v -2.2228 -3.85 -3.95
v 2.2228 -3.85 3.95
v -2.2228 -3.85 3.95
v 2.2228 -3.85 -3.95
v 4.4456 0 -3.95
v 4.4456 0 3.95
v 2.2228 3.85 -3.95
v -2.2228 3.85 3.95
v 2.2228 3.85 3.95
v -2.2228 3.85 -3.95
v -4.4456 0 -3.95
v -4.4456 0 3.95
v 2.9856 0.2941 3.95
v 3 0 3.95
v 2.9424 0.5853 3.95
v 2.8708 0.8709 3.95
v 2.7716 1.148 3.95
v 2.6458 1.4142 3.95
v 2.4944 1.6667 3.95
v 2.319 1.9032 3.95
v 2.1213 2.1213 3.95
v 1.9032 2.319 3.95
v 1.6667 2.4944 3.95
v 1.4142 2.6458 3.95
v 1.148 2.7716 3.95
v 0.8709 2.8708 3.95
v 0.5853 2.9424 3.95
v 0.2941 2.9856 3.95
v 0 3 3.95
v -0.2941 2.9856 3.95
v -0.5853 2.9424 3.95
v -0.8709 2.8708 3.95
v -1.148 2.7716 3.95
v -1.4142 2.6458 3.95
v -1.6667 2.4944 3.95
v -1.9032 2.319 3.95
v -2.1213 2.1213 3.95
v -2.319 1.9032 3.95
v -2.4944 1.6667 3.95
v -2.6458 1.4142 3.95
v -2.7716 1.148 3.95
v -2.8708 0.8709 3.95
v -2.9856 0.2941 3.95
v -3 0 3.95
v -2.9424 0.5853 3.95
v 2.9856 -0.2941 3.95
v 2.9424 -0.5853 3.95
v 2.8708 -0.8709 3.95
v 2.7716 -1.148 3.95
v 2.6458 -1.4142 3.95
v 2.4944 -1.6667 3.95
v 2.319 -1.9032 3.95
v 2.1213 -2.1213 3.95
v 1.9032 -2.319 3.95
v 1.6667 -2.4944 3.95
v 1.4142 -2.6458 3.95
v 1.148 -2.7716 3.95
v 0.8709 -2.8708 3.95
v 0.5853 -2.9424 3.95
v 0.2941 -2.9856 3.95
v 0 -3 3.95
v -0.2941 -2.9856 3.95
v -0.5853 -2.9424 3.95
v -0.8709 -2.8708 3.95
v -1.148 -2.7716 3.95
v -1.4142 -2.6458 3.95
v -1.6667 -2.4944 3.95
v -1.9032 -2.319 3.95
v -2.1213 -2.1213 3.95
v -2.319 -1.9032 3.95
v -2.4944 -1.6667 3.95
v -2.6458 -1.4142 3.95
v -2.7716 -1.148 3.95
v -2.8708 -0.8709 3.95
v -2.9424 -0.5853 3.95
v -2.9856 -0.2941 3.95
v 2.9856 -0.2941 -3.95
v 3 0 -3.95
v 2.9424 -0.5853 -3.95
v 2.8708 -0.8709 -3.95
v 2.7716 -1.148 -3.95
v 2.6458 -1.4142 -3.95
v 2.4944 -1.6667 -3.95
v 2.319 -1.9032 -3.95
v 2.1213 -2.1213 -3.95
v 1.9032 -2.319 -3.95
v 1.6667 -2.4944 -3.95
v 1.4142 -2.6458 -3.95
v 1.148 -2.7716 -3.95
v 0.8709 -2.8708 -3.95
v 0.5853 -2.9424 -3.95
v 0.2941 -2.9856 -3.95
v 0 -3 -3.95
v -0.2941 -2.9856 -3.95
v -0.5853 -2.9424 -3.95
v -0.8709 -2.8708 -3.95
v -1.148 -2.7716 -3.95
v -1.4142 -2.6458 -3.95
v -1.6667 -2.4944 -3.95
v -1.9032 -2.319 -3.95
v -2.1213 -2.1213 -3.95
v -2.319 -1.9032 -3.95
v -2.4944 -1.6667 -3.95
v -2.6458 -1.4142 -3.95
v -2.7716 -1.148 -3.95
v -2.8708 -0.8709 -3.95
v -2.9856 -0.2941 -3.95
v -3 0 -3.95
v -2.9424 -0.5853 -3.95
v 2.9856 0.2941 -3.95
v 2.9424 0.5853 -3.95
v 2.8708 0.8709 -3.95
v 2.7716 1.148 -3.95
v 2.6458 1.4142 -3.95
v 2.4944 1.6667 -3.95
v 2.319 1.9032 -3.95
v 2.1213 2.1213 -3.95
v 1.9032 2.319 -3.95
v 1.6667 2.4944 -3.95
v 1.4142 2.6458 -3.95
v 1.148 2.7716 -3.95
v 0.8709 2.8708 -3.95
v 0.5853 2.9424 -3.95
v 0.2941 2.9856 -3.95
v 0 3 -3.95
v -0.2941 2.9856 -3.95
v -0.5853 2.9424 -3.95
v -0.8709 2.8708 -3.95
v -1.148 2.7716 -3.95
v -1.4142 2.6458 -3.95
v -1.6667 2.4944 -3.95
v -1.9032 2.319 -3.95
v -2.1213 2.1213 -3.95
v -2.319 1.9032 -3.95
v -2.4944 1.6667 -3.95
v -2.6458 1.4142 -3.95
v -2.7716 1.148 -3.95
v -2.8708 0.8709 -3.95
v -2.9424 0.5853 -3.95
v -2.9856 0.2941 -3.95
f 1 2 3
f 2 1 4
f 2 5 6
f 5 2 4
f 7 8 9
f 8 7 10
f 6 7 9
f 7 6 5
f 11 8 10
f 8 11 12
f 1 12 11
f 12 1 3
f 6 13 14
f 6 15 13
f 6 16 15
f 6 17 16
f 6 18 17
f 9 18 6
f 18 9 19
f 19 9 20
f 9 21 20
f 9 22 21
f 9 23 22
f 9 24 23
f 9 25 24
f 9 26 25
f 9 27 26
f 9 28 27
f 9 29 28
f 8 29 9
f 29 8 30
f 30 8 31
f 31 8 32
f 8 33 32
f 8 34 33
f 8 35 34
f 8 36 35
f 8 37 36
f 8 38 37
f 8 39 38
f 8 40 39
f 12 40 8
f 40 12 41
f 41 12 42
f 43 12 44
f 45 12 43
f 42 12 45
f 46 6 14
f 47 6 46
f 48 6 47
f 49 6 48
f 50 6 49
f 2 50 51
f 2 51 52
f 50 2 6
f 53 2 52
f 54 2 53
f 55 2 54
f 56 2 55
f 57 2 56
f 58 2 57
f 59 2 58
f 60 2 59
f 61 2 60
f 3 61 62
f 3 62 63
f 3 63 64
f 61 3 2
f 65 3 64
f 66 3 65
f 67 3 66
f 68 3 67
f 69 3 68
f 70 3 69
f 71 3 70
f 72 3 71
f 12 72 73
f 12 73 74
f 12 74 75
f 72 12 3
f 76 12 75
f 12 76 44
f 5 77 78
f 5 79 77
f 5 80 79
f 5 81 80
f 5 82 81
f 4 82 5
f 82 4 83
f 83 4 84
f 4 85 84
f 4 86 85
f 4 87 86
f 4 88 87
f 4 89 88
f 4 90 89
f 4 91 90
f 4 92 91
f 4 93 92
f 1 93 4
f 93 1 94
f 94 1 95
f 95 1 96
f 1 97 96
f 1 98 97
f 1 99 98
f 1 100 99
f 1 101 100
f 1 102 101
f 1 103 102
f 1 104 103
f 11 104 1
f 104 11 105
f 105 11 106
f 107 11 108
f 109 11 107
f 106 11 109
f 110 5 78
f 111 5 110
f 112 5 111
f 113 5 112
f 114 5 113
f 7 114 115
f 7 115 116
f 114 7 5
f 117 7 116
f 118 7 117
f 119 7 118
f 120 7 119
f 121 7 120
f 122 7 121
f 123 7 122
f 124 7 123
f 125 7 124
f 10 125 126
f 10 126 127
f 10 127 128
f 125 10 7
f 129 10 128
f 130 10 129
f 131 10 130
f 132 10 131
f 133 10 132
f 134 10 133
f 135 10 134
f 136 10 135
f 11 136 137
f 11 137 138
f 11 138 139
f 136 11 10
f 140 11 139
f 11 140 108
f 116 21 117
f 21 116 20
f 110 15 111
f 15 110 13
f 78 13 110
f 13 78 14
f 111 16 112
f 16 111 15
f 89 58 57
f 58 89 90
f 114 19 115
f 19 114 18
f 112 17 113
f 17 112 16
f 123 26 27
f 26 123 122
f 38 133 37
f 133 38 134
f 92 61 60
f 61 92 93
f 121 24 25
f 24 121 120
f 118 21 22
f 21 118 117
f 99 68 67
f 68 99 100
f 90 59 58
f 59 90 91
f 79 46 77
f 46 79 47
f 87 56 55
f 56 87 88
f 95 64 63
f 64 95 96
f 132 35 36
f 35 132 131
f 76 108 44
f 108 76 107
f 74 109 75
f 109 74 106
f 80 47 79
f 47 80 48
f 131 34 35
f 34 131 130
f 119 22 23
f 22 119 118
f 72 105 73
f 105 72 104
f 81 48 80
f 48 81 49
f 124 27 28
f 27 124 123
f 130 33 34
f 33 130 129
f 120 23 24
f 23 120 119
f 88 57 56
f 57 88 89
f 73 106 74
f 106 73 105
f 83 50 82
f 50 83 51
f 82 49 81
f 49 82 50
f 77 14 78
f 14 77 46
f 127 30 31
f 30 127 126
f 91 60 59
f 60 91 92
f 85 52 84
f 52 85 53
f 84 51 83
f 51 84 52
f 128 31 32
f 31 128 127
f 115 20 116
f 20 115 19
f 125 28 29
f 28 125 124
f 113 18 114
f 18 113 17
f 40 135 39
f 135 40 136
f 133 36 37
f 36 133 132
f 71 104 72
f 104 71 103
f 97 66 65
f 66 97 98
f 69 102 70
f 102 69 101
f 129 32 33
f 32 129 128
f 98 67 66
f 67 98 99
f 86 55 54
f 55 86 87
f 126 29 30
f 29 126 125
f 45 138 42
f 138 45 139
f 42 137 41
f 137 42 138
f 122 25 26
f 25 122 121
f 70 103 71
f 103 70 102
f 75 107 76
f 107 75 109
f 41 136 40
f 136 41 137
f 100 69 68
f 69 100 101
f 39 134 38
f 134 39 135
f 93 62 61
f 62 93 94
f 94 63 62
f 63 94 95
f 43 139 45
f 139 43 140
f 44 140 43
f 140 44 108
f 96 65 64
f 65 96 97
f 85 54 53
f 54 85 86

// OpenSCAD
$fn=64;

screw_d = 6.0;
across_flats = 7.7;
thickness = 7.9;

module hex_prism(af, h){
    r = af / sqrt(3);
    cylinder(h=h, r=r, center=true, $fn=6);
}

module nut(af, h, hole_d){
    difference(){
        hex_prism(af, h);
        cylinder(h=h+0.4, d=hole_d, center=true, $fn=64);
    }
}

nut(across_flats, thickness, screw_d);
